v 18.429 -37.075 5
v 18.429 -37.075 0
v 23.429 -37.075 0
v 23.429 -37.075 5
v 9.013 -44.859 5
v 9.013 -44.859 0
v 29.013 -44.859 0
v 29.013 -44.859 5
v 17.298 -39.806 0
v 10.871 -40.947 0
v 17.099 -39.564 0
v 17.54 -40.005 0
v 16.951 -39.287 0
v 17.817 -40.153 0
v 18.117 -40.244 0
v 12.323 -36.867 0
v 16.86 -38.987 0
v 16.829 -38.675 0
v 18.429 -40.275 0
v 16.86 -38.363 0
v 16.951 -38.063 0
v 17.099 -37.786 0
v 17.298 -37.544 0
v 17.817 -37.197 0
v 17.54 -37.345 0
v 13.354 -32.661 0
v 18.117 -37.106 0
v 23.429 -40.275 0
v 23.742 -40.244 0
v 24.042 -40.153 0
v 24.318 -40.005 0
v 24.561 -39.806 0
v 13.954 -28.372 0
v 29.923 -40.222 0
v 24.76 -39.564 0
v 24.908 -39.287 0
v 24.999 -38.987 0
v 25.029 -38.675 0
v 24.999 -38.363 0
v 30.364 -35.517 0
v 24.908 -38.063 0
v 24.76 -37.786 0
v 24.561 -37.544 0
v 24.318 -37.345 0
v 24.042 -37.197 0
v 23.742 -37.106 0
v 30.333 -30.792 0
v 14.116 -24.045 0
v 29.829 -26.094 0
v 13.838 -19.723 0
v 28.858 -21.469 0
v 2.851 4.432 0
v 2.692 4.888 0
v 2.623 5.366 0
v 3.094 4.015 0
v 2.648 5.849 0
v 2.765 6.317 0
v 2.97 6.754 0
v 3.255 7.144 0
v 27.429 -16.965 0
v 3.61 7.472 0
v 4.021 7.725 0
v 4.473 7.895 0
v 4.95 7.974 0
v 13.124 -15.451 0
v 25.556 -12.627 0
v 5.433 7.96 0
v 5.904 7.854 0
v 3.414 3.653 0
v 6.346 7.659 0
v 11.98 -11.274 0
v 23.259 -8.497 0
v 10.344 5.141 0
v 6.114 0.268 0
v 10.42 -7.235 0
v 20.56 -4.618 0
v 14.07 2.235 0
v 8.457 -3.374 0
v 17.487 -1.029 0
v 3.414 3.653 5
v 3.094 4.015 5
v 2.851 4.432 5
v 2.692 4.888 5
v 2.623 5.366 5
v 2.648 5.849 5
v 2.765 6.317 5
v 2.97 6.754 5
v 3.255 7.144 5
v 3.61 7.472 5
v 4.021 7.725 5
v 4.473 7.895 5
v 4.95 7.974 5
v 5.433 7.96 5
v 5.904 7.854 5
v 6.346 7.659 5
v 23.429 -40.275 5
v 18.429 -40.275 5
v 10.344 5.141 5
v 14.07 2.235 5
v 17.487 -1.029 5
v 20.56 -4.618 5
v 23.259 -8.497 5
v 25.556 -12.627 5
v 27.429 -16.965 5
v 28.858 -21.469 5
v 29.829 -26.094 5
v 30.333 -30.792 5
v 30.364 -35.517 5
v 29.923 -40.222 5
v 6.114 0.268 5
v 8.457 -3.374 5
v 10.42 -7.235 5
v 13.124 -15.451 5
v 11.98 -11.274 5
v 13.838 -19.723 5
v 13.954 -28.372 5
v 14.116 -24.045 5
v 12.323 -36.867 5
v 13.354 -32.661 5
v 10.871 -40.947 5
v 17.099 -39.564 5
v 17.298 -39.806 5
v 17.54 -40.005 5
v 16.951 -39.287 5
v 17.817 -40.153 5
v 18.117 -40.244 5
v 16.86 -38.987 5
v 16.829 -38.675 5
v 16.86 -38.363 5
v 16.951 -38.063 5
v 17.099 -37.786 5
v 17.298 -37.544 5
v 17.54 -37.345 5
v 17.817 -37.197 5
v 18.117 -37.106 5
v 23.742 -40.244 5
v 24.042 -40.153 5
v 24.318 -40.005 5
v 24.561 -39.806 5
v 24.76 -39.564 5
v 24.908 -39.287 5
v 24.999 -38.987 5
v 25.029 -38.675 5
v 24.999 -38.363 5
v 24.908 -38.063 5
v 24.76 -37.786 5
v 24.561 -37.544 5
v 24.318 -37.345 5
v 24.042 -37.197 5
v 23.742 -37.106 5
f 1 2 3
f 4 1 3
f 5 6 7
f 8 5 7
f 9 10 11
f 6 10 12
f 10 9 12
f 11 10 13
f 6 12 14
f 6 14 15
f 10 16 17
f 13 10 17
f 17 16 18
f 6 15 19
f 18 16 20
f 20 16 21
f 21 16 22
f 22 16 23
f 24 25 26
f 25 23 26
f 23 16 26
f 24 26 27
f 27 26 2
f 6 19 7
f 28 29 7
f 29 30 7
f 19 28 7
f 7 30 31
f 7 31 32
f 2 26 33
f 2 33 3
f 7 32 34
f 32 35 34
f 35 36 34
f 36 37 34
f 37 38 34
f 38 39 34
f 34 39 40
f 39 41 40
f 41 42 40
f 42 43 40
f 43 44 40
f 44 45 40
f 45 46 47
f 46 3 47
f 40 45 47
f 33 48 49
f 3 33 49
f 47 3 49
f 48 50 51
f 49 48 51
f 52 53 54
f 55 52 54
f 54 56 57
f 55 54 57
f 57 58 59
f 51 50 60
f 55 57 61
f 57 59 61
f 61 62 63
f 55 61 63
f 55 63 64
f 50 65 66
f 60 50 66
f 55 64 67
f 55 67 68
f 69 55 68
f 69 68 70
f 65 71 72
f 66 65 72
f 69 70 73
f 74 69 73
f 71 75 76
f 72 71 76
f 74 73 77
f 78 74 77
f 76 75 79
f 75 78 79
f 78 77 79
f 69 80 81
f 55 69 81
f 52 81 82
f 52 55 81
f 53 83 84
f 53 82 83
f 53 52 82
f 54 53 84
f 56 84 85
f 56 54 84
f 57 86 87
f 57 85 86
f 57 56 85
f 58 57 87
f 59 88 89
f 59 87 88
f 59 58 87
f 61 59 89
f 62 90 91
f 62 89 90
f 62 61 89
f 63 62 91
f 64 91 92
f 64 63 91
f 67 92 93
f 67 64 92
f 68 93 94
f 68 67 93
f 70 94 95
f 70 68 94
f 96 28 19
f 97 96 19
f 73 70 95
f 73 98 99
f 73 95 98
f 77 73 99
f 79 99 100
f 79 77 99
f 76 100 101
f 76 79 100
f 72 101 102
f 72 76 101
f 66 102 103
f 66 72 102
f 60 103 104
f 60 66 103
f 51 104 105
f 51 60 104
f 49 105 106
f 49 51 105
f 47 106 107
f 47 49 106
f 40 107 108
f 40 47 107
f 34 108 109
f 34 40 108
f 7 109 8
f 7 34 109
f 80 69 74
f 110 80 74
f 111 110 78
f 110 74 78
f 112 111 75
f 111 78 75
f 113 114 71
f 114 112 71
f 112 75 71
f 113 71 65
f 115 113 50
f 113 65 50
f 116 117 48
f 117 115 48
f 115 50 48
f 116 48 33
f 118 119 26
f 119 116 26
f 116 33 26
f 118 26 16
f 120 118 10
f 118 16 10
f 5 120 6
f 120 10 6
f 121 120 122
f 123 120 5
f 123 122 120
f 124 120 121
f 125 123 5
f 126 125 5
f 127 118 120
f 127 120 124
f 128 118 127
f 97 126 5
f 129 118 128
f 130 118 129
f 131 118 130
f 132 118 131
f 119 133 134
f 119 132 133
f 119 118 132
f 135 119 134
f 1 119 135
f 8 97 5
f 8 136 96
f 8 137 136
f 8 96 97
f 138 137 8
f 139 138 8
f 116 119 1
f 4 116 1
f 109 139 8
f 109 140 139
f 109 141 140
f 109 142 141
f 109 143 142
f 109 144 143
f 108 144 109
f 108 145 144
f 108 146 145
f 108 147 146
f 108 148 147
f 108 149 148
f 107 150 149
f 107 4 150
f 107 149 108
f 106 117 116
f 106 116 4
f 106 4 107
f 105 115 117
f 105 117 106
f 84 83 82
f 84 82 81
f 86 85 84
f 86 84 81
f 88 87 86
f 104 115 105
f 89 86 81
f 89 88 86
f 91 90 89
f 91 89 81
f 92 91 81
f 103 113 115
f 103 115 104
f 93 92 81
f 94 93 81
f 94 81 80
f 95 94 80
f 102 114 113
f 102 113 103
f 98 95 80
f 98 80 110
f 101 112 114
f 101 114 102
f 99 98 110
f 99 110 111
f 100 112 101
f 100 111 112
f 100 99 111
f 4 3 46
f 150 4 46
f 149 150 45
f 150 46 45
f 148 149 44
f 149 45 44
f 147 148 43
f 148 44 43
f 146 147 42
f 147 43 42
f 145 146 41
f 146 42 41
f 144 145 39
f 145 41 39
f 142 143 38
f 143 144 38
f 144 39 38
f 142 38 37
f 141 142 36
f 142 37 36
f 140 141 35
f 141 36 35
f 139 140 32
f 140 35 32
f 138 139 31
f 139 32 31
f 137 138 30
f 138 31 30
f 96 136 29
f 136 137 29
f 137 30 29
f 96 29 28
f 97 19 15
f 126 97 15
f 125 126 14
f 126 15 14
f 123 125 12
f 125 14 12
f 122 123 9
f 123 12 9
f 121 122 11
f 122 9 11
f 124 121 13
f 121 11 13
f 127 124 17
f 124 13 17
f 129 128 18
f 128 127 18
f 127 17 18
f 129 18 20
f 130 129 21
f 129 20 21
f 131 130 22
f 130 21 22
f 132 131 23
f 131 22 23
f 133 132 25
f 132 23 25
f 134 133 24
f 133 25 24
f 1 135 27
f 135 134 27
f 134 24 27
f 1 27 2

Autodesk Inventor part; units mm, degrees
ref_plane "YZ Plane" through (0, 0, 0) normal (1, 0, 0) x (0, 1, 0)
ref_plane "XZ Plane" through (0, 0, 0) normal (0, 1, 0) x (-1, 0, 0)
ref_plane "XY Plane" through (0, 0, 0) normal (0, 0, 1) x (1, 0, 0)
sketch "Sketch1" plane through (0, 0, 0) normal (0, 0, 1) x (1, 0, 0)
  arc A0 (6.3455, 7.6592) -> (3.4138, 3.6532) centre (5.1207, 5.4798) ccw
  line L0 (18.4294, -37.0751) -> (23.4294, -37.0751)
  line L1 (23.4294, -40.2751) -> (18.4294, -40.2751)
  arc A1 (18.4294, -37.0751) -> (18.4294, -40.2751) centre (18.4294, -38.6751) ccw
  arc A2 (23.4294, -40.2751) -> (23.4294, -37.0751) centre (23.4294, -38.6751) ccw
  arc A3 (29.0127, -44.8588) -> (6.3455, 7.6592) centre (-16.7656, -33.4664) ccw
  arc A4 (9.0127, -44.8588) -> (3.4138, 3.6532) centre (-28.5567, -24.6156) ccw
  line L2 (9.0127, -44.8588) -> (29.0127, -44.8588)
  point P0 (0, 0)
  dimension "d20" = 3.2
  dimension "d25" = 2.5
  dimension "d32" = 20
  dimension "d35" = 5
extrude "Extrusion1" add sketch "Sketch1" along normal blind 5
properties part number "mavac_ruka I guesss"
